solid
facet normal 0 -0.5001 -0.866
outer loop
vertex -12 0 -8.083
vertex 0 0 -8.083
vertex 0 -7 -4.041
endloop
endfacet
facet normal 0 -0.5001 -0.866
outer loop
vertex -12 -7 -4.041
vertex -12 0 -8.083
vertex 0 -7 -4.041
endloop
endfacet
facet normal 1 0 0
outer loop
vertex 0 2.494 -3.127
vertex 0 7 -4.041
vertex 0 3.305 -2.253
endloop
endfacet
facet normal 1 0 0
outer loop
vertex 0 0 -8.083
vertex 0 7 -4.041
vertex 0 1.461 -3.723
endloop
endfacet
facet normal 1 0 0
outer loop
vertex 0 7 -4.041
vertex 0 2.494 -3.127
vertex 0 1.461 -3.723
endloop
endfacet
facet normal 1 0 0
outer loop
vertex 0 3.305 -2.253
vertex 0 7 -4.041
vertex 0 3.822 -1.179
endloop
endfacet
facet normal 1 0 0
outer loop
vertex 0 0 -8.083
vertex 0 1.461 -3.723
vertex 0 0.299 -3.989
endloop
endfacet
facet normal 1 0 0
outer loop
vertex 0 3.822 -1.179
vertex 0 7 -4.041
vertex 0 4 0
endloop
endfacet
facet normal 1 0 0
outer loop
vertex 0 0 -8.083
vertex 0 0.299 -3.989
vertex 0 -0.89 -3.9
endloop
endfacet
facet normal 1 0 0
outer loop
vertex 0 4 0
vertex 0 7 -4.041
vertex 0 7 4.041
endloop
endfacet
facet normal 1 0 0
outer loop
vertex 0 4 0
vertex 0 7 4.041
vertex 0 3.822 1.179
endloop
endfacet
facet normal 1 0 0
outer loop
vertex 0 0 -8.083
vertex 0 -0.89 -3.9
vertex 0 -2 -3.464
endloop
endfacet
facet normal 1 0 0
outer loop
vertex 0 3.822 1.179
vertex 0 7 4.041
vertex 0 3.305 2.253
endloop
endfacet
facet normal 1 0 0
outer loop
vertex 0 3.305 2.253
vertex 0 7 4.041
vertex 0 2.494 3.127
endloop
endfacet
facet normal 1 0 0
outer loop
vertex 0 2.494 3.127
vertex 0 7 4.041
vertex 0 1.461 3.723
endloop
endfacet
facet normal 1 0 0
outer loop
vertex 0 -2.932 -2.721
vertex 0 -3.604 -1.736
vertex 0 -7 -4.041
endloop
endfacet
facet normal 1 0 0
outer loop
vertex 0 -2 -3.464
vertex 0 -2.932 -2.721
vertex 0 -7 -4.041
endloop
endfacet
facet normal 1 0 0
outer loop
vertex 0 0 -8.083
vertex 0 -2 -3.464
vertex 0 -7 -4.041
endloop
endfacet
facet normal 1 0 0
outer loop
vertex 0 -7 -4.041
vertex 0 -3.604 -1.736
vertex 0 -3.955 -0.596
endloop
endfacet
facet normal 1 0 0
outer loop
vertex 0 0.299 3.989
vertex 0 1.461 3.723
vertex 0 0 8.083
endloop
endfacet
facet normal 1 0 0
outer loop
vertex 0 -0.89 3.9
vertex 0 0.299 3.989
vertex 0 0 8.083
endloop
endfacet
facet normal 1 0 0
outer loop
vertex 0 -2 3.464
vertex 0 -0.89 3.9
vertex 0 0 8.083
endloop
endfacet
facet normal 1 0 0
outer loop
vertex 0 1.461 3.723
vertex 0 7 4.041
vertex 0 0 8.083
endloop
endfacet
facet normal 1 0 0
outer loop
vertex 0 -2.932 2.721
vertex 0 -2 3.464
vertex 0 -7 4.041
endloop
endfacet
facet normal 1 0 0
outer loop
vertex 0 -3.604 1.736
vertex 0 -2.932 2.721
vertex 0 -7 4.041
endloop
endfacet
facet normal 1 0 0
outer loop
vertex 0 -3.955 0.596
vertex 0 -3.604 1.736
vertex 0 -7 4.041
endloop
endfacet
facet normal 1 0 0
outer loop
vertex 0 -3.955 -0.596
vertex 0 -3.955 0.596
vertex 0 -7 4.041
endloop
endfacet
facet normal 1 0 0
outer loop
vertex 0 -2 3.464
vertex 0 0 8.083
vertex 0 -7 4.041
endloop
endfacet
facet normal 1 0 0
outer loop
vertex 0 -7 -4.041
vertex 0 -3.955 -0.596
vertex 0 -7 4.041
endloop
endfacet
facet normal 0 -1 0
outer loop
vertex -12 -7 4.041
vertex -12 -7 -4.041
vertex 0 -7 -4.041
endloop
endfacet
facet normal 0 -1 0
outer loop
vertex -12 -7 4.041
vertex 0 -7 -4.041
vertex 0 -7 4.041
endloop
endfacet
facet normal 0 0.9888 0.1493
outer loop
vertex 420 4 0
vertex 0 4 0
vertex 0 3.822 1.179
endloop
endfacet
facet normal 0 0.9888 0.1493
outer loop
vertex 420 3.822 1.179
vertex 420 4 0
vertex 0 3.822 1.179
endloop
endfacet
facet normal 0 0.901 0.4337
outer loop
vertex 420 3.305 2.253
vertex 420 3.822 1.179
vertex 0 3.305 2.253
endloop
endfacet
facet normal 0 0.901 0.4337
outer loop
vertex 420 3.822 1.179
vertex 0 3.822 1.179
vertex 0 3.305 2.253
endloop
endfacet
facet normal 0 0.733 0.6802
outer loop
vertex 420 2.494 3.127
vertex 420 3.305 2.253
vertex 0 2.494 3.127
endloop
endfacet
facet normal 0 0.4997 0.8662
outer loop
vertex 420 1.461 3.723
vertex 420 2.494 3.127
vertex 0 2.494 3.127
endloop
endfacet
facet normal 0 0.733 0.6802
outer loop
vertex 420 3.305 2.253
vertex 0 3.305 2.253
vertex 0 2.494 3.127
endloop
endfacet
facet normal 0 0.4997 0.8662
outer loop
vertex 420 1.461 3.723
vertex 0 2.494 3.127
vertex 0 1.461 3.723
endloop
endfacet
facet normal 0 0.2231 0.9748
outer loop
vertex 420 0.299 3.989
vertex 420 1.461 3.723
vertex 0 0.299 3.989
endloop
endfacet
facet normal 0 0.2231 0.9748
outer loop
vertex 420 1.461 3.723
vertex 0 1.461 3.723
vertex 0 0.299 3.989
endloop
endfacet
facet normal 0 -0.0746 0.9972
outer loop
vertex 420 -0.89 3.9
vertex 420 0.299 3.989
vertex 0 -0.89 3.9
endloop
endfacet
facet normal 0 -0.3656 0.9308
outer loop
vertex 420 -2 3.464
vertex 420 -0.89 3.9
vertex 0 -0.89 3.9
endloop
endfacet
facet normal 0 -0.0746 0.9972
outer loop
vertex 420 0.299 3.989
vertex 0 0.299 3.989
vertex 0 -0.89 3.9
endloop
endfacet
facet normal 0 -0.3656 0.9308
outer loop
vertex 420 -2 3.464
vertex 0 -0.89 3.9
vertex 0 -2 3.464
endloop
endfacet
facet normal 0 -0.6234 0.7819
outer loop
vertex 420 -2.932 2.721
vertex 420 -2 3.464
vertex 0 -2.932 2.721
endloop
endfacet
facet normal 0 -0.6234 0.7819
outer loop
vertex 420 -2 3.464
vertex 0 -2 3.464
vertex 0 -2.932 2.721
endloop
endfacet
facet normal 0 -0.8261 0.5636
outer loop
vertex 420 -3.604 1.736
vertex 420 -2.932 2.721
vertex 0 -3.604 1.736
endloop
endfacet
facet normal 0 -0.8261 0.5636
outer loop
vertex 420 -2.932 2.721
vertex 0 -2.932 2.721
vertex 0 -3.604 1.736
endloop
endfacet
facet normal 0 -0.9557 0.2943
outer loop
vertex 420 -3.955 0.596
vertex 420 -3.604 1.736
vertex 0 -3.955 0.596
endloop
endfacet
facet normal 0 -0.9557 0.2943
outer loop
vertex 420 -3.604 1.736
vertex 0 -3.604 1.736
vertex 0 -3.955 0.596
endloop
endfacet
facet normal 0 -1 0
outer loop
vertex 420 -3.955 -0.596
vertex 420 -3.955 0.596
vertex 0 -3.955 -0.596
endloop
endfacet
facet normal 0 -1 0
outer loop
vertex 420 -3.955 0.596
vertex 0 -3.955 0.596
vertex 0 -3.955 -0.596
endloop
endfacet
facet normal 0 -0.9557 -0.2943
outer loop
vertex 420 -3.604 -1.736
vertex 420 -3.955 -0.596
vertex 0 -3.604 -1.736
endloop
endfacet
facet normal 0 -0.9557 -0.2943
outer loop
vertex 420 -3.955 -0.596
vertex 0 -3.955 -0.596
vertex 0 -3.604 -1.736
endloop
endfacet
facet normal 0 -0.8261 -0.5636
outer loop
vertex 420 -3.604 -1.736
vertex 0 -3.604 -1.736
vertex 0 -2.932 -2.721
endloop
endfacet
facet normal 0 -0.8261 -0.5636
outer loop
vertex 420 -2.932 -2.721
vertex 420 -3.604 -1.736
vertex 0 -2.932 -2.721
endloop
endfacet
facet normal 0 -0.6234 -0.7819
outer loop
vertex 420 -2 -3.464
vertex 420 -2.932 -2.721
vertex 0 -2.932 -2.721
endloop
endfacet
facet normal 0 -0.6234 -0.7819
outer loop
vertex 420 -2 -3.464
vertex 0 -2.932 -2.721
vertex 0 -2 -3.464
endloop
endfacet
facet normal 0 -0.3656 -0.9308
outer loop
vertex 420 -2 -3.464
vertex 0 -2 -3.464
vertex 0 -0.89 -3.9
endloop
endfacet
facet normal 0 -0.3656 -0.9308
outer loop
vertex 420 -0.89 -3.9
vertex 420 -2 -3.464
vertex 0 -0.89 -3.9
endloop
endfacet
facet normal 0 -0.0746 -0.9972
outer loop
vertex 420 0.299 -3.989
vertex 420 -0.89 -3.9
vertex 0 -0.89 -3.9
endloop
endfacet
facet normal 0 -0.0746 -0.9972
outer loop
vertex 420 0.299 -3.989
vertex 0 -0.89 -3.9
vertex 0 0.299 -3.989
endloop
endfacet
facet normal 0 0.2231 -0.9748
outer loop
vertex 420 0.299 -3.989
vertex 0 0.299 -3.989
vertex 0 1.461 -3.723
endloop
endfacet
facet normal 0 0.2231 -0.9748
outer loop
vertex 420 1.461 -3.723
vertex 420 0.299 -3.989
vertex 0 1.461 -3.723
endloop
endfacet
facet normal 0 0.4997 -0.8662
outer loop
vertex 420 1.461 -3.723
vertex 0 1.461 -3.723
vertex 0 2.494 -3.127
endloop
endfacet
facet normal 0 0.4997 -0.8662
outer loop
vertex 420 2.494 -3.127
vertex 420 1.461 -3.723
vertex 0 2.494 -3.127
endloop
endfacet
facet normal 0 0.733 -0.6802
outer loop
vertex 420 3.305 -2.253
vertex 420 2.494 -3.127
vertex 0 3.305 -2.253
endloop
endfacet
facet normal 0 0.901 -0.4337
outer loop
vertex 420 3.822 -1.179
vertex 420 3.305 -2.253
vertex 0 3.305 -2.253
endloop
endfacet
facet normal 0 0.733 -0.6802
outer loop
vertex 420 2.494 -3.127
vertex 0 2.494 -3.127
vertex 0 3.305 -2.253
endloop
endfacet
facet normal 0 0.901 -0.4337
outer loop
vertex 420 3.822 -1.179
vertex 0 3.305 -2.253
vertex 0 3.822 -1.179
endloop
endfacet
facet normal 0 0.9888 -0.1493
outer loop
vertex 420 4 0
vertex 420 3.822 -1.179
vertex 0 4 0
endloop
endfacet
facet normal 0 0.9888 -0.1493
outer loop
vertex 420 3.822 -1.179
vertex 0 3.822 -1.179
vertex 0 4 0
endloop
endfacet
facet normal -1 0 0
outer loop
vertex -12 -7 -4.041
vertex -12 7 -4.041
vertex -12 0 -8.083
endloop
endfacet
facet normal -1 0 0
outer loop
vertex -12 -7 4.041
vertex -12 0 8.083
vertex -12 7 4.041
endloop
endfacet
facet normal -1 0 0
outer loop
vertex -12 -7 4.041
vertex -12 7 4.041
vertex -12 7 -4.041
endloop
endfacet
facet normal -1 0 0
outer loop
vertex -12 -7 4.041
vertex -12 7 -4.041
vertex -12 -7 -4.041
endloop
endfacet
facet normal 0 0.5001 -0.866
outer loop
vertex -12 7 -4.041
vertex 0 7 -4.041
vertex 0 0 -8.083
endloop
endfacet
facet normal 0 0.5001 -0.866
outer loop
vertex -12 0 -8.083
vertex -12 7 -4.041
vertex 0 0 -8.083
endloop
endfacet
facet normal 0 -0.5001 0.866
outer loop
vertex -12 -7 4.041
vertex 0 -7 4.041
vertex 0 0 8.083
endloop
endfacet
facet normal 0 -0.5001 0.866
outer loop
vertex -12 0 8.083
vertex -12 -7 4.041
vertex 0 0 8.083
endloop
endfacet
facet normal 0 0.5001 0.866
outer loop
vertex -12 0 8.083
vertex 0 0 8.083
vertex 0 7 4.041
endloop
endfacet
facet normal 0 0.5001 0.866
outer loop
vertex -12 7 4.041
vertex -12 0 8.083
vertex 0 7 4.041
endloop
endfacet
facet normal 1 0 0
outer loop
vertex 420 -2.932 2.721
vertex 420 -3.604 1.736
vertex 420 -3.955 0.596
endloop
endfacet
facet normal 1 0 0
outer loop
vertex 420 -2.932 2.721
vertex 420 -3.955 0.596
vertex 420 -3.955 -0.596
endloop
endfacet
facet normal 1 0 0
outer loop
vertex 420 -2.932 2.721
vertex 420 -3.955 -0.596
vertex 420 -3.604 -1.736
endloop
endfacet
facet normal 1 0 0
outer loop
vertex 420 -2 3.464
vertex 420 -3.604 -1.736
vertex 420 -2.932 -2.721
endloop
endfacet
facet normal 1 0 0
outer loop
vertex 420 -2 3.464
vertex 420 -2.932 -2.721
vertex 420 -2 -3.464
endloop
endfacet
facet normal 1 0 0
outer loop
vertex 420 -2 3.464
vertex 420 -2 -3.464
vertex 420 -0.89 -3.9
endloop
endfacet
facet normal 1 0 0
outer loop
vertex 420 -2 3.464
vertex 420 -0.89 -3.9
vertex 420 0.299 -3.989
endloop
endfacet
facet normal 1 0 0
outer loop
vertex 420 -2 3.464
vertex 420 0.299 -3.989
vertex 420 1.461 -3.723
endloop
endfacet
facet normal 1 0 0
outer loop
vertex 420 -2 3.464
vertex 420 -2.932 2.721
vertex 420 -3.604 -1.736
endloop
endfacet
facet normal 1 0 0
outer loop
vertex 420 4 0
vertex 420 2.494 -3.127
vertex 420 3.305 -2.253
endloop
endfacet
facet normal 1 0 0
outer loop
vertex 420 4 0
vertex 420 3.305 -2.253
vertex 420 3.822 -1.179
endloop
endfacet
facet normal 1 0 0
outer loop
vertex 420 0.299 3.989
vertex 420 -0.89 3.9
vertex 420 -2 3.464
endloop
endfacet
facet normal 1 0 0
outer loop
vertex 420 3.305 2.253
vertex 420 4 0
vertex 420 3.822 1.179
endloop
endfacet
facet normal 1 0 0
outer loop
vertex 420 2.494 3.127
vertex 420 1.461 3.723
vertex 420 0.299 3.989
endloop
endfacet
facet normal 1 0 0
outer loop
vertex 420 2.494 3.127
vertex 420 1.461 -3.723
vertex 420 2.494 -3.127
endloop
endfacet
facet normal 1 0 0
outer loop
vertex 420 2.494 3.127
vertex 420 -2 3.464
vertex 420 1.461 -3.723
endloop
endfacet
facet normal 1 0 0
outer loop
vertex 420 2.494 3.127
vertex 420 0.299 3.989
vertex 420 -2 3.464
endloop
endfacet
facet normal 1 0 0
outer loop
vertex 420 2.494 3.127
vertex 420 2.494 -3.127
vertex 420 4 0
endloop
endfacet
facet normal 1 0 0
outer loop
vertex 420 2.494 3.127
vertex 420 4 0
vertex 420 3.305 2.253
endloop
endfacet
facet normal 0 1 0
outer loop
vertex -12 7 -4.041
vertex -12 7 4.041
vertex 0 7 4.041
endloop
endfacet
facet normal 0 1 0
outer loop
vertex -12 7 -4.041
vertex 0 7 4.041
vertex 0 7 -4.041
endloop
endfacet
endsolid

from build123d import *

# Parameters (mm, degrees)
SKETCH_R     = 4
PAD_DEPTH    = 420
PAD001_DEPTH = 12


with BuildPart() as part:
    # Sketch → Pad (new body)
    with BuildSketch(Plane.YZ):
        Circle(SKETCH_R)
    extrude(amount=PAD_DEPTH)

    # Sketch001 (on Face2 of Pad) → Pad001 (join)
    with BuildSketch(Plane(origin=(0, 0, 0), x_dir=(0, -1, 0), z_dir=(-1, 0, 0))):
        Polygon((7, 4.041452), (0, 8.082904), (-7, 4.041452), (-7, -4.041452), (0, -8.082904), (7, -4.041452), align=None)
    extrude(amount=PAD001_DEPTH)


solid = part.part
